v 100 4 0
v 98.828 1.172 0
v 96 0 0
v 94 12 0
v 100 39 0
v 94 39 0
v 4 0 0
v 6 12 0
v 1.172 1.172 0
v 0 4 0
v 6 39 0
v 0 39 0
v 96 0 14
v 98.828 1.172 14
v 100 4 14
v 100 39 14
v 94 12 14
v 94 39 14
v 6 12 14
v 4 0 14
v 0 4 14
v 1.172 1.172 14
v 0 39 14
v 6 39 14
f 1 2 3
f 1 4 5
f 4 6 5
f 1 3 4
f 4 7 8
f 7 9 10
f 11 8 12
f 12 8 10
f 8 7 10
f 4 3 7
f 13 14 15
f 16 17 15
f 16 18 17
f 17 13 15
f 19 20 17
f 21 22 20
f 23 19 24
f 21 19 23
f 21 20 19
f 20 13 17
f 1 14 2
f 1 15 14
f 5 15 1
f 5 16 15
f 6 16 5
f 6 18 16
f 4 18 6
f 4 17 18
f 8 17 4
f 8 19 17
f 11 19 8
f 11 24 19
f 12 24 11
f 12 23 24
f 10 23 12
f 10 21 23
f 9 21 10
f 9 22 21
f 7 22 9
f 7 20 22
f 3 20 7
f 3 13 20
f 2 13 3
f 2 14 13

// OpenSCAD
$fn = 32;

// ----------------------------------------------------------------------
// Heat sink frame: 100 x 39 mm frame, 6 mm walls
// ----------------------------------------------------------------------

// --- parameters (mm) ---
profile_height = 14;      // extrusion height
profile_points = 12;      // points of the closed outline

profile = [[0, 4], [1.172, 1.172], [4, 0], [96, 0], [98.828, 1.172], [100, 4], [100, 39], [94, 39], [94, 12], [6, 12], [6, 39], [0, 39]];  // single closed polygon, 12 points, counter clockwise

// --- the one profile operation ---
linear_extrude(height = profile_height) polygon(points = profile);
